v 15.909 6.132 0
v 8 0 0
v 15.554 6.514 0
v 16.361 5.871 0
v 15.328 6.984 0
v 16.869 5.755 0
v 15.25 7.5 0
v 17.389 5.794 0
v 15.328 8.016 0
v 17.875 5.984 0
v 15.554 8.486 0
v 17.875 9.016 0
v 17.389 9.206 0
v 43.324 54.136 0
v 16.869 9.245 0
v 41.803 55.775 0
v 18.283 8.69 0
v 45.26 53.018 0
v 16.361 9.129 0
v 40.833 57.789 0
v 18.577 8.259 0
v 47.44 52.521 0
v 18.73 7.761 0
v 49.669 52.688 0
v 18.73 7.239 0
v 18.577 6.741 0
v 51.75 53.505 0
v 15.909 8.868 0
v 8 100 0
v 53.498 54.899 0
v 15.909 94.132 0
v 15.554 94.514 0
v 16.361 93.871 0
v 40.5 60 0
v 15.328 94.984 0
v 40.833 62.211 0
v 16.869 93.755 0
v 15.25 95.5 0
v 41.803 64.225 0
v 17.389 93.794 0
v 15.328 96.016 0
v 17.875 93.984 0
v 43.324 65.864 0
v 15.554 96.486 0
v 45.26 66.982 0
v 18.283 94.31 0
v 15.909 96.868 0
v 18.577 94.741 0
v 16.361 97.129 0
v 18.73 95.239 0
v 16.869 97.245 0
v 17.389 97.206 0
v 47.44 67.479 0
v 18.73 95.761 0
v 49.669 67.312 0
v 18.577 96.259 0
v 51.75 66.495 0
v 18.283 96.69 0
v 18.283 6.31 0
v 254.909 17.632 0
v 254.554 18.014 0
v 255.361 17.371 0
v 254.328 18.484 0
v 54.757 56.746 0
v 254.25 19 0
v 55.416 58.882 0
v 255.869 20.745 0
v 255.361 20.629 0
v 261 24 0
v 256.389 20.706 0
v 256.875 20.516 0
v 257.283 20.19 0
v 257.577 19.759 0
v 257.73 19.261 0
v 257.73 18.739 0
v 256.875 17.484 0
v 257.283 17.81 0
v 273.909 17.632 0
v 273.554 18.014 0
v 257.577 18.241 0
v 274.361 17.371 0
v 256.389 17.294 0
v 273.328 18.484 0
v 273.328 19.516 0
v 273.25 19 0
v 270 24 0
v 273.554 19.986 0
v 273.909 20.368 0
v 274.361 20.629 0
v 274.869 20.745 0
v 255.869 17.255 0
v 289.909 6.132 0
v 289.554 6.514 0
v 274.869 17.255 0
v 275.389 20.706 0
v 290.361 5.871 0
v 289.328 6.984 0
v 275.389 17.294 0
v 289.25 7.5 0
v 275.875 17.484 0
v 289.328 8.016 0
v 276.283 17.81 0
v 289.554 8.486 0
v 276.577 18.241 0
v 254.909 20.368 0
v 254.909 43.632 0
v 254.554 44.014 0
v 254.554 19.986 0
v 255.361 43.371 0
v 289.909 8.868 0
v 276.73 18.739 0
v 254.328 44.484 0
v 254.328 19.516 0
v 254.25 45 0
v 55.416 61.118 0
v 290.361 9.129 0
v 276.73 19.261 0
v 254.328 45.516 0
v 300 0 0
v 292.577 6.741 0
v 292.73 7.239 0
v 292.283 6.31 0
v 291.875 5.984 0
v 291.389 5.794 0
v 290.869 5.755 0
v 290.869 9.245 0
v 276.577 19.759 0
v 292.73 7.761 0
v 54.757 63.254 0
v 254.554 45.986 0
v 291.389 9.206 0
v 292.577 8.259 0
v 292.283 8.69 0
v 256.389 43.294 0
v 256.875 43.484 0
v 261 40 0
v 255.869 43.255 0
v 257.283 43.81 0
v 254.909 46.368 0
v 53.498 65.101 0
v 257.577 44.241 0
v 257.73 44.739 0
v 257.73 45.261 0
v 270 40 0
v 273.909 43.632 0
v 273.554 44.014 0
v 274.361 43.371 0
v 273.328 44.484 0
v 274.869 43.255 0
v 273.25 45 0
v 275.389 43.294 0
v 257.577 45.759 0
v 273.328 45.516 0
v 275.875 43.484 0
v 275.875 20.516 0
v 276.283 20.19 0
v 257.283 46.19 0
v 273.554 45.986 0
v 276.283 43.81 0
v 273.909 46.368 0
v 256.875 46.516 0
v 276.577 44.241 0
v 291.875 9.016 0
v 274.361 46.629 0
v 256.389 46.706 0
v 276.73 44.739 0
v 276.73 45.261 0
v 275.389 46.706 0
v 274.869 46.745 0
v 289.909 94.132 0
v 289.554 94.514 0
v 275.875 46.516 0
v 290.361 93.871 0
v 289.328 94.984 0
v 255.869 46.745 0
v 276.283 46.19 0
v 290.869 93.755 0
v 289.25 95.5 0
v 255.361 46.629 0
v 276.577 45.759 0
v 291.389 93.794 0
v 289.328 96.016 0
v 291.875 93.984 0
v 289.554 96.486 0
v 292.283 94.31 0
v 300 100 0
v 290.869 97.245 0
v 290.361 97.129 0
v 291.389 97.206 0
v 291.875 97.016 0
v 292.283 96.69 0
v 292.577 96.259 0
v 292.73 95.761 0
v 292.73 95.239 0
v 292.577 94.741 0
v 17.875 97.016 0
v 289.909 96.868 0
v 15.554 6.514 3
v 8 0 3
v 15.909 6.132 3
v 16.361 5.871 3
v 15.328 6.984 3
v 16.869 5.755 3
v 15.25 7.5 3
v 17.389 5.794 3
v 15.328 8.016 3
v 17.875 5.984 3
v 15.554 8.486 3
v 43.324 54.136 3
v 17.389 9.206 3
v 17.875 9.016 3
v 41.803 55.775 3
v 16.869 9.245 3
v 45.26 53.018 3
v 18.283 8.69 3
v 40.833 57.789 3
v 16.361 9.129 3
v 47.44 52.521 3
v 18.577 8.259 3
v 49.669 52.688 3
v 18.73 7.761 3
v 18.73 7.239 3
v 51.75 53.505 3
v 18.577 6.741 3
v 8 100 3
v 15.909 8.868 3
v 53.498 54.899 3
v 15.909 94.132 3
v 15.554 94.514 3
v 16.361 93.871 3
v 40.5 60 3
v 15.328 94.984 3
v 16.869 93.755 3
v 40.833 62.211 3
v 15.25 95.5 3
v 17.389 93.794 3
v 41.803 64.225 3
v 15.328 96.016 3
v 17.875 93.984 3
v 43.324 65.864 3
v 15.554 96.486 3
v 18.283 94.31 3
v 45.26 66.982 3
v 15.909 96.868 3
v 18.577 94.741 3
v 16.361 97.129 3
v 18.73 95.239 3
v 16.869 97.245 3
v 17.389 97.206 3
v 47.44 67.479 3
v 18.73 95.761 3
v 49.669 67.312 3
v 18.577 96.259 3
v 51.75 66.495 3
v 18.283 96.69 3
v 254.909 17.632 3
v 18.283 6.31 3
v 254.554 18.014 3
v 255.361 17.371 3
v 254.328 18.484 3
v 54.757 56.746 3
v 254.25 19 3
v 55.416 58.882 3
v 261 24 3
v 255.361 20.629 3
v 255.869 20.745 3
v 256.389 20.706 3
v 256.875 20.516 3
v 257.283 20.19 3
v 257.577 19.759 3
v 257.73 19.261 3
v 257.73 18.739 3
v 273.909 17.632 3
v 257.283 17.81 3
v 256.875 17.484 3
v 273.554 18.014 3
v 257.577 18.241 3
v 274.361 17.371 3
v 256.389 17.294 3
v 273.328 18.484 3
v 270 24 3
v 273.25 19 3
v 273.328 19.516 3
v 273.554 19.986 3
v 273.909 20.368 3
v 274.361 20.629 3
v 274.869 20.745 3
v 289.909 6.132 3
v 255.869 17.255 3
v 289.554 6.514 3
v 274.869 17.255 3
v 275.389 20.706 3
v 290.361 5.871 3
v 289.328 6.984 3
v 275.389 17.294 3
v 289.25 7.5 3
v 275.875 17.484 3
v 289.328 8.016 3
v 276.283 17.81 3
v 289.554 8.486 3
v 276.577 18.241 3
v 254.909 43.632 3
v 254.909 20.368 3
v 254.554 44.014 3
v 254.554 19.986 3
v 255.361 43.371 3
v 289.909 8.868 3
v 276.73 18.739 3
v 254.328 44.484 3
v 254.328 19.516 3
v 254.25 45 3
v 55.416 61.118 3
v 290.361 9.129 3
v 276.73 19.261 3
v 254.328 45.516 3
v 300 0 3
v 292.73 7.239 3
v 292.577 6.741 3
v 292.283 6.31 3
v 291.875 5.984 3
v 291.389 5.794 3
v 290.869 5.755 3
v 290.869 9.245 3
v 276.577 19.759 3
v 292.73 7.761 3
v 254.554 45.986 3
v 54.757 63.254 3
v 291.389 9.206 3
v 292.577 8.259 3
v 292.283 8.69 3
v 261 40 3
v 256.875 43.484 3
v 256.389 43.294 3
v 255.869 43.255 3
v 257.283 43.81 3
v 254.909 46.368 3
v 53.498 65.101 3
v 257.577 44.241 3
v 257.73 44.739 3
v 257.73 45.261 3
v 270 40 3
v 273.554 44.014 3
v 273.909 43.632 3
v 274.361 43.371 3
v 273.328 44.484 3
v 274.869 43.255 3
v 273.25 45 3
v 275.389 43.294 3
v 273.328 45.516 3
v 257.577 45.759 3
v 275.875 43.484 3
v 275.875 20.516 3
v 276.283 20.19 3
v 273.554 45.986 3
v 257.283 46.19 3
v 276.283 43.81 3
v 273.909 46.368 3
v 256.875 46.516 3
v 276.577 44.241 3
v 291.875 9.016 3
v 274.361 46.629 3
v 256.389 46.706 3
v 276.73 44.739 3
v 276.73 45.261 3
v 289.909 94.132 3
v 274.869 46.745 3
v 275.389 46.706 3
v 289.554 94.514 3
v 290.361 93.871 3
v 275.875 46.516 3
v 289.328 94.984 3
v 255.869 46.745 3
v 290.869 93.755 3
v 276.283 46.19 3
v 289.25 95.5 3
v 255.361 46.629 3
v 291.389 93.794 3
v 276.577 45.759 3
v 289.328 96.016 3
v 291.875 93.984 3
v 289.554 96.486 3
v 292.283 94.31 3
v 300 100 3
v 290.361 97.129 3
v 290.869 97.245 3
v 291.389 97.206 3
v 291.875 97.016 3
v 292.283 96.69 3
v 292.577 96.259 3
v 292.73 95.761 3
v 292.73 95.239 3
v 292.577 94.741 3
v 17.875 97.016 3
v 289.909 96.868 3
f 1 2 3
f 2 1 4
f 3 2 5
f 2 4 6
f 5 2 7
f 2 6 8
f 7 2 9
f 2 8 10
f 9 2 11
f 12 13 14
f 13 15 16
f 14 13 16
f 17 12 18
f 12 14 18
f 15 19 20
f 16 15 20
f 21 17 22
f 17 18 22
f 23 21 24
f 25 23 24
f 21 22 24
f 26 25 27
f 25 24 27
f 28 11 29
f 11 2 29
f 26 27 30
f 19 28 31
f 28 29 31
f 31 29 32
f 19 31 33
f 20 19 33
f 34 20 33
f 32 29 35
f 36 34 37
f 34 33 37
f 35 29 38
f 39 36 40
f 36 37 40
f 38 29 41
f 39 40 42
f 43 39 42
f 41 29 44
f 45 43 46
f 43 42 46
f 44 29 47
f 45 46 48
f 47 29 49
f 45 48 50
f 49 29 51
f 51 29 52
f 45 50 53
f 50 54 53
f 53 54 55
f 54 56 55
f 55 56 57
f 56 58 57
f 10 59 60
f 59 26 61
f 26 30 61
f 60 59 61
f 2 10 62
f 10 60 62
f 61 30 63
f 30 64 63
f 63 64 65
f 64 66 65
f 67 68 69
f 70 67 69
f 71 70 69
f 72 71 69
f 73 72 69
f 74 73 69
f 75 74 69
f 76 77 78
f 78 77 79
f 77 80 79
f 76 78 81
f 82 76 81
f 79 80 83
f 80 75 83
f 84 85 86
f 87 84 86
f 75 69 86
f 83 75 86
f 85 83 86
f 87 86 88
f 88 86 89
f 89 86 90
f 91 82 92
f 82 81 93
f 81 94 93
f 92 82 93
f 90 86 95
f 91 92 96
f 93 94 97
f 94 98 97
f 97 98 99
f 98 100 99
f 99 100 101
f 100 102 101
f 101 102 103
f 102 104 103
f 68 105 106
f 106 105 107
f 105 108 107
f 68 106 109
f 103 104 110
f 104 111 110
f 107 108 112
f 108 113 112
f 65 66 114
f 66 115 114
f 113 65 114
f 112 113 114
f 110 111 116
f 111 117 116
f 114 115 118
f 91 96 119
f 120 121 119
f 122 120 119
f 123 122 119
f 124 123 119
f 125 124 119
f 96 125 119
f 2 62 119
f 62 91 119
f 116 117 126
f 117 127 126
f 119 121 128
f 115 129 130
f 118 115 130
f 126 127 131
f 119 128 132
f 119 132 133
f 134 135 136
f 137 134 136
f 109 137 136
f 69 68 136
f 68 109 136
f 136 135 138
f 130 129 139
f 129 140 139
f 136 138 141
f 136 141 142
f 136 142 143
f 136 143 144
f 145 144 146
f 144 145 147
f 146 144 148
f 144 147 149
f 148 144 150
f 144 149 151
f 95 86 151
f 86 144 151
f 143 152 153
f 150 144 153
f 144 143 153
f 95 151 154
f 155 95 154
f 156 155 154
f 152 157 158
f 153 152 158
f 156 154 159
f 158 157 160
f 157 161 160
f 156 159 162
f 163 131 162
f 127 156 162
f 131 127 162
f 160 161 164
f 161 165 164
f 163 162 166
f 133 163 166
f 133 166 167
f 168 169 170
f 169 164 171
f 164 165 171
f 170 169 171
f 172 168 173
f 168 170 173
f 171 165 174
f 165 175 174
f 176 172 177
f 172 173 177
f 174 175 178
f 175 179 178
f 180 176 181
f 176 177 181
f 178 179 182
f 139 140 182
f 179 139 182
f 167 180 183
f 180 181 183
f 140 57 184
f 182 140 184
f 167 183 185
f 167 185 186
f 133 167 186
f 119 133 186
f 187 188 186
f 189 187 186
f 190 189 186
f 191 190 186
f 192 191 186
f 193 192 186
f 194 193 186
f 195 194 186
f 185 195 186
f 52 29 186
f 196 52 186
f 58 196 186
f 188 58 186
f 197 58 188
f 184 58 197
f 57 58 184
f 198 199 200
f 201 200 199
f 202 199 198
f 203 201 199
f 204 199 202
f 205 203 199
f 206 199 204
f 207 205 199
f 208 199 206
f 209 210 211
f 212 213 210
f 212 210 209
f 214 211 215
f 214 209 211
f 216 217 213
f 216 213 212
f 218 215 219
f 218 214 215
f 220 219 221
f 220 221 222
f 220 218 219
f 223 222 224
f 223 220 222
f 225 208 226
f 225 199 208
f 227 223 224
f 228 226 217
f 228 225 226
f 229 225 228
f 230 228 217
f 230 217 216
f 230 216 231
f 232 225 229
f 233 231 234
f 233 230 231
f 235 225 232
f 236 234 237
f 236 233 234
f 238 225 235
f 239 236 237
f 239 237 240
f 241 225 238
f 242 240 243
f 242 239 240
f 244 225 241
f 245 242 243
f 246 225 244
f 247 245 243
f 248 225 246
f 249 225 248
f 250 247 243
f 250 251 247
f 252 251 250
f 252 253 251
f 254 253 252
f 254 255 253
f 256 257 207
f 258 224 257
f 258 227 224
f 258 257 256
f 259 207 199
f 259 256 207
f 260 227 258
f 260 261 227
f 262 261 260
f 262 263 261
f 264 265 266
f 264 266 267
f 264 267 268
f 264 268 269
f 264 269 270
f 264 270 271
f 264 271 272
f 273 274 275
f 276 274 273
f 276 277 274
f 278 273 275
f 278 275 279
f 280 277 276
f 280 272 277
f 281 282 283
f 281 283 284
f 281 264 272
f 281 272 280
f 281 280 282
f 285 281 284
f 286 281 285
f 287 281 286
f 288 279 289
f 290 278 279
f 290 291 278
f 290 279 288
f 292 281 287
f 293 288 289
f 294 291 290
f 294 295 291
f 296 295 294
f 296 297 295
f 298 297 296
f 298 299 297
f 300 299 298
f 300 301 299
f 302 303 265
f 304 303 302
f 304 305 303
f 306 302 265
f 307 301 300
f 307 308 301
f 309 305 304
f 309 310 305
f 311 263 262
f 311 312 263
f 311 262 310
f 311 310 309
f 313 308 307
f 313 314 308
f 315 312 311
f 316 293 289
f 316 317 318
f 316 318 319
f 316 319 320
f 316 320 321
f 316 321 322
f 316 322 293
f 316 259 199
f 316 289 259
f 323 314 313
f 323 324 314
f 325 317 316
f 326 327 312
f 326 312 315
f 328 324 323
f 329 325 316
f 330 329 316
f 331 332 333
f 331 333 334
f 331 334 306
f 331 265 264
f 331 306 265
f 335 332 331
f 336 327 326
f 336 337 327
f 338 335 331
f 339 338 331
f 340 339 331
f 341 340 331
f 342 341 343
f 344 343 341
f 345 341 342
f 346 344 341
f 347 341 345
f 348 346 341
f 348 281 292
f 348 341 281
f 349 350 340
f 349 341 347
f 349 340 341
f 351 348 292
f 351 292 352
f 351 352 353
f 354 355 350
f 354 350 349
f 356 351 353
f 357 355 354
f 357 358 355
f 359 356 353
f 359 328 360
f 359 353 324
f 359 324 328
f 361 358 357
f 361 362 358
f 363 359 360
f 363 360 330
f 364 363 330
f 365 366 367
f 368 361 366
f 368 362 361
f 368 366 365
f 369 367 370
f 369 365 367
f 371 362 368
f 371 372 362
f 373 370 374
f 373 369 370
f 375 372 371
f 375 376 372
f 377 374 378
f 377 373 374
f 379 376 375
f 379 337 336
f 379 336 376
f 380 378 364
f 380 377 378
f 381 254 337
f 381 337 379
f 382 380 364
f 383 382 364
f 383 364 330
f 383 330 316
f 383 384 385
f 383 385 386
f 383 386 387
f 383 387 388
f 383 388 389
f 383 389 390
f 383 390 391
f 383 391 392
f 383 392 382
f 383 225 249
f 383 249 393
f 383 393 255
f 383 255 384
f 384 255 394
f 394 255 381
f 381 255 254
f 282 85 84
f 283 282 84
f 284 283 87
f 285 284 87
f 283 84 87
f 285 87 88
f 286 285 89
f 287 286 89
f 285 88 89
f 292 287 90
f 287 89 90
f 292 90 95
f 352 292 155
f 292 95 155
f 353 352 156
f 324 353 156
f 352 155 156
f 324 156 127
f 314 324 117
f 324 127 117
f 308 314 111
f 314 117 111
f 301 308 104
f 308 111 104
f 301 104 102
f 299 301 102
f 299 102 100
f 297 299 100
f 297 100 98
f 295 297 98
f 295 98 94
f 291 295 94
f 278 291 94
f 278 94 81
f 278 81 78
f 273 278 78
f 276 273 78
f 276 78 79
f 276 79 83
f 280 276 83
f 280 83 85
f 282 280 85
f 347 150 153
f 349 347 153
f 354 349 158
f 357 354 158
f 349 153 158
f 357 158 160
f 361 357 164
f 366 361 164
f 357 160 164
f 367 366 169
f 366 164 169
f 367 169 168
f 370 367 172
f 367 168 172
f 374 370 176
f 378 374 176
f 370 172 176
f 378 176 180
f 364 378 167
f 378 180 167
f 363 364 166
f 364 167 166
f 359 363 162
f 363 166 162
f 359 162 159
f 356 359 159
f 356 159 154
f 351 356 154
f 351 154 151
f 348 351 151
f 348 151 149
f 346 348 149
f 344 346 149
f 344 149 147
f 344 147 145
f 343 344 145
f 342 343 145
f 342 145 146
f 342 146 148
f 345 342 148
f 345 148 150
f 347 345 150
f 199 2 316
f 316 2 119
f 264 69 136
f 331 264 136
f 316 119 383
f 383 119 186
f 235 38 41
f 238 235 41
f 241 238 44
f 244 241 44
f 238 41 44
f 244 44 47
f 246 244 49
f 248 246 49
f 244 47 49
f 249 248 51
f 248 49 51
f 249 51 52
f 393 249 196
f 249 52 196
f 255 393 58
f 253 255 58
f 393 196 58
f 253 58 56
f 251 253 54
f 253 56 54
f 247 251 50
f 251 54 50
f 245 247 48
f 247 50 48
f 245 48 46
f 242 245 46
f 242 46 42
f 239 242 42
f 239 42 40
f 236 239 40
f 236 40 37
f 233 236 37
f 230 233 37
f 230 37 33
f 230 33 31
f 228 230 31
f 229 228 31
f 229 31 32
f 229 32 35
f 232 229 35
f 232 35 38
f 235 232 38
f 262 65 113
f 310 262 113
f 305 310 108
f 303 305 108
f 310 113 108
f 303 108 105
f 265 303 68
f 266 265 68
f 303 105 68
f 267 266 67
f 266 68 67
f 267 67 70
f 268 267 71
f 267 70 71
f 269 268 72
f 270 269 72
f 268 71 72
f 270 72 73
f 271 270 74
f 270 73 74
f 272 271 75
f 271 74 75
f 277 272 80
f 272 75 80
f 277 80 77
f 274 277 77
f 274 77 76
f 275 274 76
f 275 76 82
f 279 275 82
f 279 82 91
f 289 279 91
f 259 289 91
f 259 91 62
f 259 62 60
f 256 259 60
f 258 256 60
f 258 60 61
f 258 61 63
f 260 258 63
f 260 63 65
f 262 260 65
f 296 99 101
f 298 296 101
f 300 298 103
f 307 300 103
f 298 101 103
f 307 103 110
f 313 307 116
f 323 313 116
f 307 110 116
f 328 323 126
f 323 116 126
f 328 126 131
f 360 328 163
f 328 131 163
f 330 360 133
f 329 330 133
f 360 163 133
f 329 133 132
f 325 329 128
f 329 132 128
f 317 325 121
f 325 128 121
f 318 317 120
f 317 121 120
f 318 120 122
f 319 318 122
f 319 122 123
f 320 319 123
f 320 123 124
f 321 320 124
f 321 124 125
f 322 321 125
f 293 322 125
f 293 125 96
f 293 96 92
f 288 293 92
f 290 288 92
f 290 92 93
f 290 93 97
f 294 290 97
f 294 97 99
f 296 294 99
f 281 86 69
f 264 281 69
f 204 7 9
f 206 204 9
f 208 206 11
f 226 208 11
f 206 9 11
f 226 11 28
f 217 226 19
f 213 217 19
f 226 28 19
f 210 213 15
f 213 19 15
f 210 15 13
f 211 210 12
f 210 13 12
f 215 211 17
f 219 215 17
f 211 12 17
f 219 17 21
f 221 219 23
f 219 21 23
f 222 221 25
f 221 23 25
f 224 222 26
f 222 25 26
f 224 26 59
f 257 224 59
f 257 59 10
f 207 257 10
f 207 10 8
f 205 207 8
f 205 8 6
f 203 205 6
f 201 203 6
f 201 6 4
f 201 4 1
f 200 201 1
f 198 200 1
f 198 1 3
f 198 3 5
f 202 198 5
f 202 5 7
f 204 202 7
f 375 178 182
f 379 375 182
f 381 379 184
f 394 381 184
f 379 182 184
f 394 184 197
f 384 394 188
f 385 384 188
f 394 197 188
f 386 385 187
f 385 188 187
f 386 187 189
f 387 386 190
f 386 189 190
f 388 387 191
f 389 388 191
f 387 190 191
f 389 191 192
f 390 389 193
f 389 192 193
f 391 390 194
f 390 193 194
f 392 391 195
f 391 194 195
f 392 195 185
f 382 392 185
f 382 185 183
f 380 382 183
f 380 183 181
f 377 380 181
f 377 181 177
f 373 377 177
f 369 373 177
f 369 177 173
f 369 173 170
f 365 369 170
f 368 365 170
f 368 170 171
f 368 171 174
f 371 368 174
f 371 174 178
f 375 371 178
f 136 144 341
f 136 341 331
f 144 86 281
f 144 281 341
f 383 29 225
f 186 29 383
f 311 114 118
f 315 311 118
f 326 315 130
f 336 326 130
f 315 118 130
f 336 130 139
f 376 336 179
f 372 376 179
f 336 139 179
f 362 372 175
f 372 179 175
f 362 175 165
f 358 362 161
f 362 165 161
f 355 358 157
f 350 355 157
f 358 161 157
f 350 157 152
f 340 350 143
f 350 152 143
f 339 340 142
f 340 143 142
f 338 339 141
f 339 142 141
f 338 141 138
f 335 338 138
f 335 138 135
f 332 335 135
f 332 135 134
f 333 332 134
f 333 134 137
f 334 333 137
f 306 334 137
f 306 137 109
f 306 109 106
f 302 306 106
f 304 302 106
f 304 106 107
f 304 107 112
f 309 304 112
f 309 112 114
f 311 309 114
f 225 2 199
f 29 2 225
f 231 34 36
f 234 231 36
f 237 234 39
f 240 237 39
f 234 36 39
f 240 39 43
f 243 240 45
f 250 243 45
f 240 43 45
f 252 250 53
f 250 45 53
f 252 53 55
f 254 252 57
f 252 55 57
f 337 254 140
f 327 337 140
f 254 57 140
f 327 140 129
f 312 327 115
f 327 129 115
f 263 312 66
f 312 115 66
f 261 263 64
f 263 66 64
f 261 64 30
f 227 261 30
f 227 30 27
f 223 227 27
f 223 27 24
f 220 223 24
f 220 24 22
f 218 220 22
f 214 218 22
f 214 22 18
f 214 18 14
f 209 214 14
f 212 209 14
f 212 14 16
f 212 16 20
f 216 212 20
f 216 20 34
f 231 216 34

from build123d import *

# Parameters (mm, degrees)
SKETCH1_W           = 300
SKETCH1_H           = 100
BOSS_EXTRUDE1_DEPTH = 3
SKETCH3_W           = 8
SKETCH3_H           = 100
CUT_EXTRUDE2_DEPTH  = 10
SKETCH4_R           = 1.75
CUT_EXTRUDE3_DEPTH  = 4
SKETCH5_R           = 7.5
CUT_EXTRUDE4_DEPTH  = 10
SKETCH6_R           = 1.75
SKETCH6_W           = 9
SKETCH6_H           = 16
CUT_EXTRUDE5_DEPTH  = 10


with BuildPart() as part:
    # Sketch1 → Boss-Extrude1 (new body)
    with BuildSketch(Plane.XY):
        with Locations((150, 50)):
            Rectangle(SKETCH1_W, SKETCH1_H)
    extrude(amount=BOSS_EXTRUDE1_DEPTH)

    # Sketch3 → Cut-Extrude2 (cut)
    with BuildSketch(Plane(origin=(0, 0, 0), x_dir=(-1, 0, 0), z_dir=(0, 0, -1))):
        with Locations((-4, 50)):
            Rectangle(SKETCH3_W, SKETCH3_H)
    extrude(amount=-CUT_EXTRUDE2_DEPTH, mode=Mode.SUBTRACT)

    # Sketch4 → Cut-Extrude3 (cut, through all)
    with BuildSketch(Plane(origin=(0, 0, 0), x_dir=(-1, 0, 0), z_dir=(0, 0, -1))):
        with Locations((-291, 95.5)):
            Circle(SKETCH4_R)
        with Locations((-17, 95.5)):
            Circle(SKETCH4_R)
        with Locations((-17, 7.5)):
            Circle(SKETCH4_R)
        with Locations((-291, 7.5)):
            Circle(SKETCH4_R)
    extrude(amount=-CUT_EXTRUDE3_DEPTH, mode=Mode.SUBTRACT)

    # Sketch5 → Cut-Extrude4 (cut)
    with BuildSketch(Plane(origin=(0, 0, 0), x_dir=(-1, 0, 0), z_dir=(0, 0, -1))):
        with Locations((-48, 60)):
            Circle(SKETCH5_R)
    extrude(amount=-CUT_EXTRUDE4_DEPTH, mode=Mode.SUBTRACT)

    # Sketch6 → Cut-Extrude5 (cut)
    with BuildSketch(Plane(origin=(0, 0, 0), x_dir=(-1, 0, 0), z_dir=(0, 0, -1))):
        with Locations((-275, 45)):
            Circle(SKETCH6_R)
        with Locations((-275, 19)):
            Circle(SKETCH6_R)
        with Locations((-256, 19)):
            Circle(SKETCH6_R)
        with Locations((-256, 45)):
            Circle(SKETCH6_R)
        with Locations((-265.5, 32)):
            Rectangle(SKETCH6_W, SKETCH6_H)
    extrude(amount=-CUT_EXTRUDE5_DEPTH, mode=Mode.SUBTRACT)


solid = part.part
